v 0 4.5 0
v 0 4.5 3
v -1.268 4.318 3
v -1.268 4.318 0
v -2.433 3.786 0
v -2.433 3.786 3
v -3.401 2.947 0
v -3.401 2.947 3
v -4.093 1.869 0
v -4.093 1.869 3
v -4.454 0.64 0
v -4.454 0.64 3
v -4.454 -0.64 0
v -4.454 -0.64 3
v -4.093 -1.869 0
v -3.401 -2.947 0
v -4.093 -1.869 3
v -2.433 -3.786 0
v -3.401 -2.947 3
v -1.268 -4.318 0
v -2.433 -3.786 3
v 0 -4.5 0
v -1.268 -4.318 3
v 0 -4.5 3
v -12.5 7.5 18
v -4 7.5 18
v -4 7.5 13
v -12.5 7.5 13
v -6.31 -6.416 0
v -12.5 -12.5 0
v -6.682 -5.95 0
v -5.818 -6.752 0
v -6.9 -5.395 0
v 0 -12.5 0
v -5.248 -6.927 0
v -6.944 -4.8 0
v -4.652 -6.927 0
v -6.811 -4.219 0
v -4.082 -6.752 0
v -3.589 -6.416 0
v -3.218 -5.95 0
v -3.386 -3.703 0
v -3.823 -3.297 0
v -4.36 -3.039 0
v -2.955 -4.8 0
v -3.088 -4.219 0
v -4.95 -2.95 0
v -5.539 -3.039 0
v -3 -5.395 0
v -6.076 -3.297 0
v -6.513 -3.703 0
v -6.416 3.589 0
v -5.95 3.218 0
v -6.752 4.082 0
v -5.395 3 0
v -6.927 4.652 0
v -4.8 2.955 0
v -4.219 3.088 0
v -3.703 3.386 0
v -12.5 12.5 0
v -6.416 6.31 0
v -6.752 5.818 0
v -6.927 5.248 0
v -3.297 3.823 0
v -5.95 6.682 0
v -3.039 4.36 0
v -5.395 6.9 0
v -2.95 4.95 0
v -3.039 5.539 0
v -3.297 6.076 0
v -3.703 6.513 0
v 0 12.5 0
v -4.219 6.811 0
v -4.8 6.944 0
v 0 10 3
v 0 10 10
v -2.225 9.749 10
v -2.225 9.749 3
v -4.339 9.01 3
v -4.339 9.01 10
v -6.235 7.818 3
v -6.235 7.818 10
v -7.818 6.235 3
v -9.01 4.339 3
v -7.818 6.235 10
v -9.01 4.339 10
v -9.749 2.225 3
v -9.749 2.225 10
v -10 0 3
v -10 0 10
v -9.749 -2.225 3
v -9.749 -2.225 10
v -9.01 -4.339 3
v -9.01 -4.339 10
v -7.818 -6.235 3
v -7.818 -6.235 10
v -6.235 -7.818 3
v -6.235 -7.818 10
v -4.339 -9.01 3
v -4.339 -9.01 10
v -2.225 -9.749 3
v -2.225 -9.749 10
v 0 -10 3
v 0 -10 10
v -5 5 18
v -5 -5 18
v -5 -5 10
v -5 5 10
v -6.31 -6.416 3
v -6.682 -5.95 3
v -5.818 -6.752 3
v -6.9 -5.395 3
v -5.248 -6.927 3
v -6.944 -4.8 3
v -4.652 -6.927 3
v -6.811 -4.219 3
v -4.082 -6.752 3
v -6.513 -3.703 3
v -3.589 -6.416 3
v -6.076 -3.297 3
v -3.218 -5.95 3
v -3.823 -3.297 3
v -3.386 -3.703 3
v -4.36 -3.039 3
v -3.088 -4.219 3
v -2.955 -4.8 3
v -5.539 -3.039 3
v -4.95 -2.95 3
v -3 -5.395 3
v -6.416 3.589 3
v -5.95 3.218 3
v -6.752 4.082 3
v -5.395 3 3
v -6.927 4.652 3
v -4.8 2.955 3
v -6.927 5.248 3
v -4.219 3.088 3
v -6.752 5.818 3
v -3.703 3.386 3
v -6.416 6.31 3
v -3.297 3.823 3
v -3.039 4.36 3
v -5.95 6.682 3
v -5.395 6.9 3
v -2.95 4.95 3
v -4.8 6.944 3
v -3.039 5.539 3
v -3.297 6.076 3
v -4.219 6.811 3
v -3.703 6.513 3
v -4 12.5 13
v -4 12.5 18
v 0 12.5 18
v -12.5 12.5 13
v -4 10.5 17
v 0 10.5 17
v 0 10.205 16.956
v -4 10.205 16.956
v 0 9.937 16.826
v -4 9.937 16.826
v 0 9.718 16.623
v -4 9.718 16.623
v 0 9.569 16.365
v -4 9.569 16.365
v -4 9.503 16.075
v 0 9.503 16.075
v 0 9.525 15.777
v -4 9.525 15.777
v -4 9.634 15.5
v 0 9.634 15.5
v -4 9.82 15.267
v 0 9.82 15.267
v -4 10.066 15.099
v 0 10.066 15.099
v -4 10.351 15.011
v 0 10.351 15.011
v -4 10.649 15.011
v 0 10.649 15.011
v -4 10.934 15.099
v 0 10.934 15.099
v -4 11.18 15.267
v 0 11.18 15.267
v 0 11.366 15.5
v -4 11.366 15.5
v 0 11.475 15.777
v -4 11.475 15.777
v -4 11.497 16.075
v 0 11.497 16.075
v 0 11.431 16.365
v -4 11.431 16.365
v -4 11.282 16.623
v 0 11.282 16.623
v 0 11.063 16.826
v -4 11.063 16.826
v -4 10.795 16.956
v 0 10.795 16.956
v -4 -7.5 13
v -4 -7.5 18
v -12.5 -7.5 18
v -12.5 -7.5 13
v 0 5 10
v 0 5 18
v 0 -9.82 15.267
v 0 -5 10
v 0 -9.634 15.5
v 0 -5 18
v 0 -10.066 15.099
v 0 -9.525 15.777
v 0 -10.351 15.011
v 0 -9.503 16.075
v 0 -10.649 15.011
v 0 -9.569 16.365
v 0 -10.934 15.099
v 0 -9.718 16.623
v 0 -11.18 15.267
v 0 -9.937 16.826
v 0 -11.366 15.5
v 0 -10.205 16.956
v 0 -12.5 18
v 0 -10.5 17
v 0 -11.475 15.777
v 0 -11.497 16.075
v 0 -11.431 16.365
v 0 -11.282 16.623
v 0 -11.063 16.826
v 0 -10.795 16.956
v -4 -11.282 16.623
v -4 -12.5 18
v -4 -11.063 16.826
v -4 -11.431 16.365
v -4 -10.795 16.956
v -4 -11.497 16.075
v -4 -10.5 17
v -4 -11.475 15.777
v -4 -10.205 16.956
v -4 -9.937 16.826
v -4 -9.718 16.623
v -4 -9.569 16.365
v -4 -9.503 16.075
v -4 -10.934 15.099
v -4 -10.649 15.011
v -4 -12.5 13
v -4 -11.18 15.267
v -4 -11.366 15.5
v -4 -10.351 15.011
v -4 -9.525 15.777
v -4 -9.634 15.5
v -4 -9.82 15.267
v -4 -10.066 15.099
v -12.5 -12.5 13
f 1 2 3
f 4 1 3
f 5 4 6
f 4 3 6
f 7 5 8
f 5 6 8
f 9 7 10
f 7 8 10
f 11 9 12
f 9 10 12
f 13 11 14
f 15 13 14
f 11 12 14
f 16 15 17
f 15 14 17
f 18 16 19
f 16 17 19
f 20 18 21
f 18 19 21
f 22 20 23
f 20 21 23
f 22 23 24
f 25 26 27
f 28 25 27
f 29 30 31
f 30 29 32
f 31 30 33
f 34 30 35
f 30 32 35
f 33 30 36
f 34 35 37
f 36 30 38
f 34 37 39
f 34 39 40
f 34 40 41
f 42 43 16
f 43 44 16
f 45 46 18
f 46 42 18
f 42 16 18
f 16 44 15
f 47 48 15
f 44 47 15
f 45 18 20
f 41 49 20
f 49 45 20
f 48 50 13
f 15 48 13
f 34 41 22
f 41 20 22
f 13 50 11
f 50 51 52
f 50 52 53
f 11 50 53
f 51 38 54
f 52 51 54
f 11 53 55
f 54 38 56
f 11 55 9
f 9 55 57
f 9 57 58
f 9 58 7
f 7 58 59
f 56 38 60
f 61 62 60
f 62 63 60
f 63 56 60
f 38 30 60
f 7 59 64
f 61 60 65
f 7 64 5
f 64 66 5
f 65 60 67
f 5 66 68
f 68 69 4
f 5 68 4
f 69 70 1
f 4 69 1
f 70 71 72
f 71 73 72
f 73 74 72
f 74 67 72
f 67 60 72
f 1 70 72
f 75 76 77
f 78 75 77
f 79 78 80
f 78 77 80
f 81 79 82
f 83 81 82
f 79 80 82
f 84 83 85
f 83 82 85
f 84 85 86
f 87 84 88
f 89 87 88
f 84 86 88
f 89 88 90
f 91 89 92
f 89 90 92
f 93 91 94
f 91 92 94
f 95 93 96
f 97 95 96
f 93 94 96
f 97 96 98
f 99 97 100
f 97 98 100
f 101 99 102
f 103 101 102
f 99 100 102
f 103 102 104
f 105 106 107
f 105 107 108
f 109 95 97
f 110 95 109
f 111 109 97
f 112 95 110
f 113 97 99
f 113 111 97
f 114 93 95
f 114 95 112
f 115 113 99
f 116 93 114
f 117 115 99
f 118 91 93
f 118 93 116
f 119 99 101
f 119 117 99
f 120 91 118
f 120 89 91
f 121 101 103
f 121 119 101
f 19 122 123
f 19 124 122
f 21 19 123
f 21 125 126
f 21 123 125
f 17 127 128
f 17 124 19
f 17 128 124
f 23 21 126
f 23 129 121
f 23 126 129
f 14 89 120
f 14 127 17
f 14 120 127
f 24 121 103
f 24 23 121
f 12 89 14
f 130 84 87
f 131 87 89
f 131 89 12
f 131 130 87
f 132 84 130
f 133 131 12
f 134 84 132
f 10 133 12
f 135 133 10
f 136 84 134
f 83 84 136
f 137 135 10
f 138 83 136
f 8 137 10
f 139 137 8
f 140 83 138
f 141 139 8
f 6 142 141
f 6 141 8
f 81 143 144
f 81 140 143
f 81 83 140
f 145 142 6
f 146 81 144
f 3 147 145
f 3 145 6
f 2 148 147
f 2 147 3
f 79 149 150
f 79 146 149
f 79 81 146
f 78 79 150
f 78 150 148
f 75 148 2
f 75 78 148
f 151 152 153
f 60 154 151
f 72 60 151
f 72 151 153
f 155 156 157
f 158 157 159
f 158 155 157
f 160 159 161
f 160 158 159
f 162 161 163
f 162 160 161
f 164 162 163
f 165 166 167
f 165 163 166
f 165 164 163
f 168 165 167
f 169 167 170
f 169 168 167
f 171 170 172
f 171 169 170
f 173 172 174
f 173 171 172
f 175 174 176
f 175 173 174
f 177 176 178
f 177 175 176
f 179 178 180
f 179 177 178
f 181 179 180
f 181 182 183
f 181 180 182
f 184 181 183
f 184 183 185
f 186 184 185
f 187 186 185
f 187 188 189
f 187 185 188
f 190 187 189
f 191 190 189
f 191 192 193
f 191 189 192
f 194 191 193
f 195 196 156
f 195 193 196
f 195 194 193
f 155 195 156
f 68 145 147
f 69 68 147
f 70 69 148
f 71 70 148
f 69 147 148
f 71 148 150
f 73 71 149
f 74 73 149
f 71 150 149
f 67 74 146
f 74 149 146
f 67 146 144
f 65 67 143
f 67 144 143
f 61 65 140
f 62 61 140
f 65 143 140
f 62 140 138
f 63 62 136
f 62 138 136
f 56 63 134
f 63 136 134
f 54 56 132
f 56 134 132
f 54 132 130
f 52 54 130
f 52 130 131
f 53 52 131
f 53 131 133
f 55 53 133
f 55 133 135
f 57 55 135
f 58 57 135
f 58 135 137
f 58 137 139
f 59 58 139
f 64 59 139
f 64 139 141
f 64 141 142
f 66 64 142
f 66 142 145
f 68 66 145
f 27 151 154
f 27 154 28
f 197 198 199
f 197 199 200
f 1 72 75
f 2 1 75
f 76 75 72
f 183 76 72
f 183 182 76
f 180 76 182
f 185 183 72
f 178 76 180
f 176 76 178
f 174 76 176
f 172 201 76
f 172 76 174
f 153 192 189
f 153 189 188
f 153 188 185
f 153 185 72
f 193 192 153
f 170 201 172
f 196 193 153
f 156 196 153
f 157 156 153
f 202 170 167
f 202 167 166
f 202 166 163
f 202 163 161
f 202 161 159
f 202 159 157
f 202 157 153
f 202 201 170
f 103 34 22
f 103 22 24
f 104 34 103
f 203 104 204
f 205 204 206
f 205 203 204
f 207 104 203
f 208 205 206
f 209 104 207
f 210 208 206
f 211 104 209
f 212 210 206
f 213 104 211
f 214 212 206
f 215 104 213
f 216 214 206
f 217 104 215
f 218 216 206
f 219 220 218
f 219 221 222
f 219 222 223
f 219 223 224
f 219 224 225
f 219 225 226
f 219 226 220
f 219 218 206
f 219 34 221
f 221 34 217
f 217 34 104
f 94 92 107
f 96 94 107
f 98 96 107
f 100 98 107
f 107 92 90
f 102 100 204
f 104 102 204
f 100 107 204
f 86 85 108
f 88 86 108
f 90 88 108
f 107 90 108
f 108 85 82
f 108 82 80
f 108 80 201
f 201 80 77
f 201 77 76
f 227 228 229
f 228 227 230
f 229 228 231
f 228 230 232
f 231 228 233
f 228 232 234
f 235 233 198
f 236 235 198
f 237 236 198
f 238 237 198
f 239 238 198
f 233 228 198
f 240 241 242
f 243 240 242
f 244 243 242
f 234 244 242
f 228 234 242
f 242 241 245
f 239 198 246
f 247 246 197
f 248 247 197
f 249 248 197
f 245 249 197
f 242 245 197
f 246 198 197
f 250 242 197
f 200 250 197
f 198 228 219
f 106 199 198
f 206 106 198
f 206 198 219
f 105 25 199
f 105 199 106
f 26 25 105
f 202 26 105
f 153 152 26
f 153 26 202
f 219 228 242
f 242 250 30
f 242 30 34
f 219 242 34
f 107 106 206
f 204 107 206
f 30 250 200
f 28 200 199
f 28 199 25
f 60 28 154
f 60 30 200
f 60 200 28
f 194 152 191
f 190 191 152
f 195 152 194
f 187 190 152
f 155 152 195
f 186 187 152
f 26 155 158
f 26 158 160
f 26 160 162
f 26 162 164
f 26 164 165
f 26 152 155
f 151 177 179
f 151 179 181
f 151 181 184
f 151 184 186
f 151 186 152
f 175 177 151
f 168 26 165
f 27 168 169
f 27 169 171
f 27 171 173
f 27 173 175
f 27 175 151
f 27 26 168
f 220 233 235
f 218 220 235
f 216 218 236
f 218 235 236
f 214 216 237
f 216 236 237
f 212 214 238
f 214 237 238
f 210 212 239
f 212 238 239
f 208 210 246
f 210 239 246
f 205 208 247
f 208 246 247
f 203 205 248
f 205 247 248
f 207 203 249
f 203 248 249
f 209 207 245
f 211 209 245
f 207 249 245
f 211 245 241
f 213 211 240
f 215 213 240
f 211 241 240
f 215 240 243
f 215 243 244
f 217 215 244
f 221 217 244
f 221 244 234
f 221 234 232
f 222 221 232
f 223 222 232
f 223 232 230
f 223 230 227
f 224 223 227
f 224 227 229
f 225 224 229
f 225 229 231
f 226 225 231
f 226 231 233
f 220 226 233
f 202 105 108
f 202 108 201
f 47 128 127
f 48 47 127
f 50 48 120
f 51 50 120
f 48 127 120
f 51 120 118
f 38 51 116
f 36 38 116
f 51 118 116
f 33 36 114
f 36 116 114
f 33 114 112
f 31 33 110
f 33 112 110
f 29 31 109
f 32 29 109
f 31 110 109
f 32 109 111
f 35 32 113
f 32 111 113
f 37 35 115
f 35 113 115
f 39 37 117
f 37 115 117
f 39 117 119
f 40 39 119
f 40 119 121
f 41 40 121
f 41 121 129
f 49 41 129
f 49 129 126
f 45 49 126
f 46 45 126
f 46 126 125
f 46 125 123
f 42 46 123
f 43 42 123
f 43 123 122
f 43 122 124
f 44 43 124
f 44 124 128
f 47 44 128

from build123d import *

# Parameters (mm, degrees)
SKETCH_1_W               = 25
SKETCH_1_H               = 25
EXTRUDE_1_DEPTH          = 10
SKETCH_2_R               = 10
CUT_EXTRUDE_1_DEPTH      = 7
SKETCH_3_R               = 4.5
CUT_EXTRUDE_2_DEPTH      = 20.013153342
SKETCH_4_R               = 2
CUT_EXTRUDE_4_DEPTH      = 20.013153342
PATTERN_CIRCULAR_1_COUNT = 4
SKETCH_5_W               = 25
SKETCH_5_H               = 25
EXTRUDE_2_DEPTH          = 8
SKETCH_6_W               = 10
SKETCH_6_H               = 10
CUT_EXTRUDE_5_DEPTH      = 8
SKETCH_8_W               = 17.447834749
SKETCH_8_H               = 20.945056097
CUT_EXTRUDE_8_DEPTH      = 34.24530042
CUT_EXTRUDE_START        = -4
SKETCH_12_W              = 5
SKETCH_12_H              = 5
CUT_EXTRUDE_9_DEPTH      = 22.228951623
SKETCH_13_R              = 1
CUT_EXTRUDE_10_DEPTH     = 24.505318547


with BuildPart() as part:
    # 草图1 → 凸台-拉伸1 (new body)
    with BuildSketch(Plane.XY):
        Rectangle(SKETCH_1_W, SKETCH_1_H)
    extrude(amount=EXTRUDE_1_DEPTH)

    # 草图2 → 切除-拉伸1 (cut)
    with BuildSketch(Plane.XY.offset(10)):
        Circle(SKETCH_2_R)
    extrude(amount=-CUT_EXTRUDE_1_DEPTH, mode=Mode.SUBTRACT)

    # 草图3 → 切除-拉伸2 (cut, through all)
    with BuildSketch(Plane.XY.offset(3)):
        Circle(SKETCH_3_R)
    extrude(amount=-CUT_EXTRUDE_2_DEPTH, mode=Mode.SUBTRACT)

    # 草图4 → 切除-拉伸4 (cut, through all)
    with BuildSketch(Plane.XY.offset(3)):
        with Locations((-4.949747468, 4.949747468)):
            Circle(SKETCH_4_R)
    cut_extrude_4 = extrude(amount=-CUT_EXTRUDE_4_DEPTH, mode=Mode.SUBTRACT)

    # 阵列(圆周)1: 切除-拉伸4 ×4 about axis
    pattern_circular_1_axis = Axis((0, 0, 0), (0, 0, 1))
    for i in range(1, PATTERN_CIRCULAR_1_COUNT):
        add(cut_extrude_4.rotate(pattern_circular_1_axis, i * 360 / PATTERN_CIRCULAR_1_COUNT), mode=Mode.SUBTRACT)

    # 草图5 → 凸台-拉伸2 (add)
    with BuildSketch(Plane.XY.offset(10)):
        Rectangle(SKETCH_5_W, SKETCH_5_H)
    extrude(amount=EXTRUDE_2_DEPTH)

    # 草图6 → 切除-拉伸5 (cut)
    with BuildSketch(Plane.XY.offset(18)):
        Rectangle(SKETCH_6_W, SKETCH_6_H)
    extrude(amount=-CUT_EXTRUDE_5_DEPTH, mode=Mode.SUBTRACT)

    # 草图8 → 切除-拉伸8 (cut, through all)
    with BuildSketch(Plane.XZ.offset(12.5)):
        with Locations((8.723917375, 10.472528049)):
            Rectangle(SKETCH_8_W, SKETCH_8_H)
    extrude(amount=-CUT_EXTRUDE_8_DEPTH, mode=Mode.SUBTRACT)

    # 草图12 → 切除-拉伸9 (cut, through all)
    with BuildSketch(Plane(origin=(0, 0, 0), x_dir=(0, 0, -1), z_dir=(1, 0, 0)).offset(CUT_EXTRUDE_START)):
        with Locations((-15.5, -10)):
            Rectangle(SKETCH_12_W, SKETCH_12_H)
    cut_extrude_9 = extrude(amount=-CUT_EXTRUDE_9_DEPTH, mode=Mode.SUBTRACT)

    # 镜向1: 切除-拉伸9 across plane
    add(cut_extrude_9.mirror(Plane.ZX), mode=Mode.SUBTRACT)

    # 草图13 → 切除-拉伸10 (cut, through all)
    with BuildSketch(Plane.ZY.offset(4)):
        with Locations((16, -10.5)):
            Circle(SKETCH_13_R)
    cut_extrude_10 = extrude(amount=-CUT_EXTRUDE_10_DEPTH, mode=Mode.SUBTRACT)

    # 镜向2: 切除-拉伸10 across plane
    add(cut_extrude_10.mirror(Plane.ZX), mode=Mode.SUBTRACT)


solid = part.part
